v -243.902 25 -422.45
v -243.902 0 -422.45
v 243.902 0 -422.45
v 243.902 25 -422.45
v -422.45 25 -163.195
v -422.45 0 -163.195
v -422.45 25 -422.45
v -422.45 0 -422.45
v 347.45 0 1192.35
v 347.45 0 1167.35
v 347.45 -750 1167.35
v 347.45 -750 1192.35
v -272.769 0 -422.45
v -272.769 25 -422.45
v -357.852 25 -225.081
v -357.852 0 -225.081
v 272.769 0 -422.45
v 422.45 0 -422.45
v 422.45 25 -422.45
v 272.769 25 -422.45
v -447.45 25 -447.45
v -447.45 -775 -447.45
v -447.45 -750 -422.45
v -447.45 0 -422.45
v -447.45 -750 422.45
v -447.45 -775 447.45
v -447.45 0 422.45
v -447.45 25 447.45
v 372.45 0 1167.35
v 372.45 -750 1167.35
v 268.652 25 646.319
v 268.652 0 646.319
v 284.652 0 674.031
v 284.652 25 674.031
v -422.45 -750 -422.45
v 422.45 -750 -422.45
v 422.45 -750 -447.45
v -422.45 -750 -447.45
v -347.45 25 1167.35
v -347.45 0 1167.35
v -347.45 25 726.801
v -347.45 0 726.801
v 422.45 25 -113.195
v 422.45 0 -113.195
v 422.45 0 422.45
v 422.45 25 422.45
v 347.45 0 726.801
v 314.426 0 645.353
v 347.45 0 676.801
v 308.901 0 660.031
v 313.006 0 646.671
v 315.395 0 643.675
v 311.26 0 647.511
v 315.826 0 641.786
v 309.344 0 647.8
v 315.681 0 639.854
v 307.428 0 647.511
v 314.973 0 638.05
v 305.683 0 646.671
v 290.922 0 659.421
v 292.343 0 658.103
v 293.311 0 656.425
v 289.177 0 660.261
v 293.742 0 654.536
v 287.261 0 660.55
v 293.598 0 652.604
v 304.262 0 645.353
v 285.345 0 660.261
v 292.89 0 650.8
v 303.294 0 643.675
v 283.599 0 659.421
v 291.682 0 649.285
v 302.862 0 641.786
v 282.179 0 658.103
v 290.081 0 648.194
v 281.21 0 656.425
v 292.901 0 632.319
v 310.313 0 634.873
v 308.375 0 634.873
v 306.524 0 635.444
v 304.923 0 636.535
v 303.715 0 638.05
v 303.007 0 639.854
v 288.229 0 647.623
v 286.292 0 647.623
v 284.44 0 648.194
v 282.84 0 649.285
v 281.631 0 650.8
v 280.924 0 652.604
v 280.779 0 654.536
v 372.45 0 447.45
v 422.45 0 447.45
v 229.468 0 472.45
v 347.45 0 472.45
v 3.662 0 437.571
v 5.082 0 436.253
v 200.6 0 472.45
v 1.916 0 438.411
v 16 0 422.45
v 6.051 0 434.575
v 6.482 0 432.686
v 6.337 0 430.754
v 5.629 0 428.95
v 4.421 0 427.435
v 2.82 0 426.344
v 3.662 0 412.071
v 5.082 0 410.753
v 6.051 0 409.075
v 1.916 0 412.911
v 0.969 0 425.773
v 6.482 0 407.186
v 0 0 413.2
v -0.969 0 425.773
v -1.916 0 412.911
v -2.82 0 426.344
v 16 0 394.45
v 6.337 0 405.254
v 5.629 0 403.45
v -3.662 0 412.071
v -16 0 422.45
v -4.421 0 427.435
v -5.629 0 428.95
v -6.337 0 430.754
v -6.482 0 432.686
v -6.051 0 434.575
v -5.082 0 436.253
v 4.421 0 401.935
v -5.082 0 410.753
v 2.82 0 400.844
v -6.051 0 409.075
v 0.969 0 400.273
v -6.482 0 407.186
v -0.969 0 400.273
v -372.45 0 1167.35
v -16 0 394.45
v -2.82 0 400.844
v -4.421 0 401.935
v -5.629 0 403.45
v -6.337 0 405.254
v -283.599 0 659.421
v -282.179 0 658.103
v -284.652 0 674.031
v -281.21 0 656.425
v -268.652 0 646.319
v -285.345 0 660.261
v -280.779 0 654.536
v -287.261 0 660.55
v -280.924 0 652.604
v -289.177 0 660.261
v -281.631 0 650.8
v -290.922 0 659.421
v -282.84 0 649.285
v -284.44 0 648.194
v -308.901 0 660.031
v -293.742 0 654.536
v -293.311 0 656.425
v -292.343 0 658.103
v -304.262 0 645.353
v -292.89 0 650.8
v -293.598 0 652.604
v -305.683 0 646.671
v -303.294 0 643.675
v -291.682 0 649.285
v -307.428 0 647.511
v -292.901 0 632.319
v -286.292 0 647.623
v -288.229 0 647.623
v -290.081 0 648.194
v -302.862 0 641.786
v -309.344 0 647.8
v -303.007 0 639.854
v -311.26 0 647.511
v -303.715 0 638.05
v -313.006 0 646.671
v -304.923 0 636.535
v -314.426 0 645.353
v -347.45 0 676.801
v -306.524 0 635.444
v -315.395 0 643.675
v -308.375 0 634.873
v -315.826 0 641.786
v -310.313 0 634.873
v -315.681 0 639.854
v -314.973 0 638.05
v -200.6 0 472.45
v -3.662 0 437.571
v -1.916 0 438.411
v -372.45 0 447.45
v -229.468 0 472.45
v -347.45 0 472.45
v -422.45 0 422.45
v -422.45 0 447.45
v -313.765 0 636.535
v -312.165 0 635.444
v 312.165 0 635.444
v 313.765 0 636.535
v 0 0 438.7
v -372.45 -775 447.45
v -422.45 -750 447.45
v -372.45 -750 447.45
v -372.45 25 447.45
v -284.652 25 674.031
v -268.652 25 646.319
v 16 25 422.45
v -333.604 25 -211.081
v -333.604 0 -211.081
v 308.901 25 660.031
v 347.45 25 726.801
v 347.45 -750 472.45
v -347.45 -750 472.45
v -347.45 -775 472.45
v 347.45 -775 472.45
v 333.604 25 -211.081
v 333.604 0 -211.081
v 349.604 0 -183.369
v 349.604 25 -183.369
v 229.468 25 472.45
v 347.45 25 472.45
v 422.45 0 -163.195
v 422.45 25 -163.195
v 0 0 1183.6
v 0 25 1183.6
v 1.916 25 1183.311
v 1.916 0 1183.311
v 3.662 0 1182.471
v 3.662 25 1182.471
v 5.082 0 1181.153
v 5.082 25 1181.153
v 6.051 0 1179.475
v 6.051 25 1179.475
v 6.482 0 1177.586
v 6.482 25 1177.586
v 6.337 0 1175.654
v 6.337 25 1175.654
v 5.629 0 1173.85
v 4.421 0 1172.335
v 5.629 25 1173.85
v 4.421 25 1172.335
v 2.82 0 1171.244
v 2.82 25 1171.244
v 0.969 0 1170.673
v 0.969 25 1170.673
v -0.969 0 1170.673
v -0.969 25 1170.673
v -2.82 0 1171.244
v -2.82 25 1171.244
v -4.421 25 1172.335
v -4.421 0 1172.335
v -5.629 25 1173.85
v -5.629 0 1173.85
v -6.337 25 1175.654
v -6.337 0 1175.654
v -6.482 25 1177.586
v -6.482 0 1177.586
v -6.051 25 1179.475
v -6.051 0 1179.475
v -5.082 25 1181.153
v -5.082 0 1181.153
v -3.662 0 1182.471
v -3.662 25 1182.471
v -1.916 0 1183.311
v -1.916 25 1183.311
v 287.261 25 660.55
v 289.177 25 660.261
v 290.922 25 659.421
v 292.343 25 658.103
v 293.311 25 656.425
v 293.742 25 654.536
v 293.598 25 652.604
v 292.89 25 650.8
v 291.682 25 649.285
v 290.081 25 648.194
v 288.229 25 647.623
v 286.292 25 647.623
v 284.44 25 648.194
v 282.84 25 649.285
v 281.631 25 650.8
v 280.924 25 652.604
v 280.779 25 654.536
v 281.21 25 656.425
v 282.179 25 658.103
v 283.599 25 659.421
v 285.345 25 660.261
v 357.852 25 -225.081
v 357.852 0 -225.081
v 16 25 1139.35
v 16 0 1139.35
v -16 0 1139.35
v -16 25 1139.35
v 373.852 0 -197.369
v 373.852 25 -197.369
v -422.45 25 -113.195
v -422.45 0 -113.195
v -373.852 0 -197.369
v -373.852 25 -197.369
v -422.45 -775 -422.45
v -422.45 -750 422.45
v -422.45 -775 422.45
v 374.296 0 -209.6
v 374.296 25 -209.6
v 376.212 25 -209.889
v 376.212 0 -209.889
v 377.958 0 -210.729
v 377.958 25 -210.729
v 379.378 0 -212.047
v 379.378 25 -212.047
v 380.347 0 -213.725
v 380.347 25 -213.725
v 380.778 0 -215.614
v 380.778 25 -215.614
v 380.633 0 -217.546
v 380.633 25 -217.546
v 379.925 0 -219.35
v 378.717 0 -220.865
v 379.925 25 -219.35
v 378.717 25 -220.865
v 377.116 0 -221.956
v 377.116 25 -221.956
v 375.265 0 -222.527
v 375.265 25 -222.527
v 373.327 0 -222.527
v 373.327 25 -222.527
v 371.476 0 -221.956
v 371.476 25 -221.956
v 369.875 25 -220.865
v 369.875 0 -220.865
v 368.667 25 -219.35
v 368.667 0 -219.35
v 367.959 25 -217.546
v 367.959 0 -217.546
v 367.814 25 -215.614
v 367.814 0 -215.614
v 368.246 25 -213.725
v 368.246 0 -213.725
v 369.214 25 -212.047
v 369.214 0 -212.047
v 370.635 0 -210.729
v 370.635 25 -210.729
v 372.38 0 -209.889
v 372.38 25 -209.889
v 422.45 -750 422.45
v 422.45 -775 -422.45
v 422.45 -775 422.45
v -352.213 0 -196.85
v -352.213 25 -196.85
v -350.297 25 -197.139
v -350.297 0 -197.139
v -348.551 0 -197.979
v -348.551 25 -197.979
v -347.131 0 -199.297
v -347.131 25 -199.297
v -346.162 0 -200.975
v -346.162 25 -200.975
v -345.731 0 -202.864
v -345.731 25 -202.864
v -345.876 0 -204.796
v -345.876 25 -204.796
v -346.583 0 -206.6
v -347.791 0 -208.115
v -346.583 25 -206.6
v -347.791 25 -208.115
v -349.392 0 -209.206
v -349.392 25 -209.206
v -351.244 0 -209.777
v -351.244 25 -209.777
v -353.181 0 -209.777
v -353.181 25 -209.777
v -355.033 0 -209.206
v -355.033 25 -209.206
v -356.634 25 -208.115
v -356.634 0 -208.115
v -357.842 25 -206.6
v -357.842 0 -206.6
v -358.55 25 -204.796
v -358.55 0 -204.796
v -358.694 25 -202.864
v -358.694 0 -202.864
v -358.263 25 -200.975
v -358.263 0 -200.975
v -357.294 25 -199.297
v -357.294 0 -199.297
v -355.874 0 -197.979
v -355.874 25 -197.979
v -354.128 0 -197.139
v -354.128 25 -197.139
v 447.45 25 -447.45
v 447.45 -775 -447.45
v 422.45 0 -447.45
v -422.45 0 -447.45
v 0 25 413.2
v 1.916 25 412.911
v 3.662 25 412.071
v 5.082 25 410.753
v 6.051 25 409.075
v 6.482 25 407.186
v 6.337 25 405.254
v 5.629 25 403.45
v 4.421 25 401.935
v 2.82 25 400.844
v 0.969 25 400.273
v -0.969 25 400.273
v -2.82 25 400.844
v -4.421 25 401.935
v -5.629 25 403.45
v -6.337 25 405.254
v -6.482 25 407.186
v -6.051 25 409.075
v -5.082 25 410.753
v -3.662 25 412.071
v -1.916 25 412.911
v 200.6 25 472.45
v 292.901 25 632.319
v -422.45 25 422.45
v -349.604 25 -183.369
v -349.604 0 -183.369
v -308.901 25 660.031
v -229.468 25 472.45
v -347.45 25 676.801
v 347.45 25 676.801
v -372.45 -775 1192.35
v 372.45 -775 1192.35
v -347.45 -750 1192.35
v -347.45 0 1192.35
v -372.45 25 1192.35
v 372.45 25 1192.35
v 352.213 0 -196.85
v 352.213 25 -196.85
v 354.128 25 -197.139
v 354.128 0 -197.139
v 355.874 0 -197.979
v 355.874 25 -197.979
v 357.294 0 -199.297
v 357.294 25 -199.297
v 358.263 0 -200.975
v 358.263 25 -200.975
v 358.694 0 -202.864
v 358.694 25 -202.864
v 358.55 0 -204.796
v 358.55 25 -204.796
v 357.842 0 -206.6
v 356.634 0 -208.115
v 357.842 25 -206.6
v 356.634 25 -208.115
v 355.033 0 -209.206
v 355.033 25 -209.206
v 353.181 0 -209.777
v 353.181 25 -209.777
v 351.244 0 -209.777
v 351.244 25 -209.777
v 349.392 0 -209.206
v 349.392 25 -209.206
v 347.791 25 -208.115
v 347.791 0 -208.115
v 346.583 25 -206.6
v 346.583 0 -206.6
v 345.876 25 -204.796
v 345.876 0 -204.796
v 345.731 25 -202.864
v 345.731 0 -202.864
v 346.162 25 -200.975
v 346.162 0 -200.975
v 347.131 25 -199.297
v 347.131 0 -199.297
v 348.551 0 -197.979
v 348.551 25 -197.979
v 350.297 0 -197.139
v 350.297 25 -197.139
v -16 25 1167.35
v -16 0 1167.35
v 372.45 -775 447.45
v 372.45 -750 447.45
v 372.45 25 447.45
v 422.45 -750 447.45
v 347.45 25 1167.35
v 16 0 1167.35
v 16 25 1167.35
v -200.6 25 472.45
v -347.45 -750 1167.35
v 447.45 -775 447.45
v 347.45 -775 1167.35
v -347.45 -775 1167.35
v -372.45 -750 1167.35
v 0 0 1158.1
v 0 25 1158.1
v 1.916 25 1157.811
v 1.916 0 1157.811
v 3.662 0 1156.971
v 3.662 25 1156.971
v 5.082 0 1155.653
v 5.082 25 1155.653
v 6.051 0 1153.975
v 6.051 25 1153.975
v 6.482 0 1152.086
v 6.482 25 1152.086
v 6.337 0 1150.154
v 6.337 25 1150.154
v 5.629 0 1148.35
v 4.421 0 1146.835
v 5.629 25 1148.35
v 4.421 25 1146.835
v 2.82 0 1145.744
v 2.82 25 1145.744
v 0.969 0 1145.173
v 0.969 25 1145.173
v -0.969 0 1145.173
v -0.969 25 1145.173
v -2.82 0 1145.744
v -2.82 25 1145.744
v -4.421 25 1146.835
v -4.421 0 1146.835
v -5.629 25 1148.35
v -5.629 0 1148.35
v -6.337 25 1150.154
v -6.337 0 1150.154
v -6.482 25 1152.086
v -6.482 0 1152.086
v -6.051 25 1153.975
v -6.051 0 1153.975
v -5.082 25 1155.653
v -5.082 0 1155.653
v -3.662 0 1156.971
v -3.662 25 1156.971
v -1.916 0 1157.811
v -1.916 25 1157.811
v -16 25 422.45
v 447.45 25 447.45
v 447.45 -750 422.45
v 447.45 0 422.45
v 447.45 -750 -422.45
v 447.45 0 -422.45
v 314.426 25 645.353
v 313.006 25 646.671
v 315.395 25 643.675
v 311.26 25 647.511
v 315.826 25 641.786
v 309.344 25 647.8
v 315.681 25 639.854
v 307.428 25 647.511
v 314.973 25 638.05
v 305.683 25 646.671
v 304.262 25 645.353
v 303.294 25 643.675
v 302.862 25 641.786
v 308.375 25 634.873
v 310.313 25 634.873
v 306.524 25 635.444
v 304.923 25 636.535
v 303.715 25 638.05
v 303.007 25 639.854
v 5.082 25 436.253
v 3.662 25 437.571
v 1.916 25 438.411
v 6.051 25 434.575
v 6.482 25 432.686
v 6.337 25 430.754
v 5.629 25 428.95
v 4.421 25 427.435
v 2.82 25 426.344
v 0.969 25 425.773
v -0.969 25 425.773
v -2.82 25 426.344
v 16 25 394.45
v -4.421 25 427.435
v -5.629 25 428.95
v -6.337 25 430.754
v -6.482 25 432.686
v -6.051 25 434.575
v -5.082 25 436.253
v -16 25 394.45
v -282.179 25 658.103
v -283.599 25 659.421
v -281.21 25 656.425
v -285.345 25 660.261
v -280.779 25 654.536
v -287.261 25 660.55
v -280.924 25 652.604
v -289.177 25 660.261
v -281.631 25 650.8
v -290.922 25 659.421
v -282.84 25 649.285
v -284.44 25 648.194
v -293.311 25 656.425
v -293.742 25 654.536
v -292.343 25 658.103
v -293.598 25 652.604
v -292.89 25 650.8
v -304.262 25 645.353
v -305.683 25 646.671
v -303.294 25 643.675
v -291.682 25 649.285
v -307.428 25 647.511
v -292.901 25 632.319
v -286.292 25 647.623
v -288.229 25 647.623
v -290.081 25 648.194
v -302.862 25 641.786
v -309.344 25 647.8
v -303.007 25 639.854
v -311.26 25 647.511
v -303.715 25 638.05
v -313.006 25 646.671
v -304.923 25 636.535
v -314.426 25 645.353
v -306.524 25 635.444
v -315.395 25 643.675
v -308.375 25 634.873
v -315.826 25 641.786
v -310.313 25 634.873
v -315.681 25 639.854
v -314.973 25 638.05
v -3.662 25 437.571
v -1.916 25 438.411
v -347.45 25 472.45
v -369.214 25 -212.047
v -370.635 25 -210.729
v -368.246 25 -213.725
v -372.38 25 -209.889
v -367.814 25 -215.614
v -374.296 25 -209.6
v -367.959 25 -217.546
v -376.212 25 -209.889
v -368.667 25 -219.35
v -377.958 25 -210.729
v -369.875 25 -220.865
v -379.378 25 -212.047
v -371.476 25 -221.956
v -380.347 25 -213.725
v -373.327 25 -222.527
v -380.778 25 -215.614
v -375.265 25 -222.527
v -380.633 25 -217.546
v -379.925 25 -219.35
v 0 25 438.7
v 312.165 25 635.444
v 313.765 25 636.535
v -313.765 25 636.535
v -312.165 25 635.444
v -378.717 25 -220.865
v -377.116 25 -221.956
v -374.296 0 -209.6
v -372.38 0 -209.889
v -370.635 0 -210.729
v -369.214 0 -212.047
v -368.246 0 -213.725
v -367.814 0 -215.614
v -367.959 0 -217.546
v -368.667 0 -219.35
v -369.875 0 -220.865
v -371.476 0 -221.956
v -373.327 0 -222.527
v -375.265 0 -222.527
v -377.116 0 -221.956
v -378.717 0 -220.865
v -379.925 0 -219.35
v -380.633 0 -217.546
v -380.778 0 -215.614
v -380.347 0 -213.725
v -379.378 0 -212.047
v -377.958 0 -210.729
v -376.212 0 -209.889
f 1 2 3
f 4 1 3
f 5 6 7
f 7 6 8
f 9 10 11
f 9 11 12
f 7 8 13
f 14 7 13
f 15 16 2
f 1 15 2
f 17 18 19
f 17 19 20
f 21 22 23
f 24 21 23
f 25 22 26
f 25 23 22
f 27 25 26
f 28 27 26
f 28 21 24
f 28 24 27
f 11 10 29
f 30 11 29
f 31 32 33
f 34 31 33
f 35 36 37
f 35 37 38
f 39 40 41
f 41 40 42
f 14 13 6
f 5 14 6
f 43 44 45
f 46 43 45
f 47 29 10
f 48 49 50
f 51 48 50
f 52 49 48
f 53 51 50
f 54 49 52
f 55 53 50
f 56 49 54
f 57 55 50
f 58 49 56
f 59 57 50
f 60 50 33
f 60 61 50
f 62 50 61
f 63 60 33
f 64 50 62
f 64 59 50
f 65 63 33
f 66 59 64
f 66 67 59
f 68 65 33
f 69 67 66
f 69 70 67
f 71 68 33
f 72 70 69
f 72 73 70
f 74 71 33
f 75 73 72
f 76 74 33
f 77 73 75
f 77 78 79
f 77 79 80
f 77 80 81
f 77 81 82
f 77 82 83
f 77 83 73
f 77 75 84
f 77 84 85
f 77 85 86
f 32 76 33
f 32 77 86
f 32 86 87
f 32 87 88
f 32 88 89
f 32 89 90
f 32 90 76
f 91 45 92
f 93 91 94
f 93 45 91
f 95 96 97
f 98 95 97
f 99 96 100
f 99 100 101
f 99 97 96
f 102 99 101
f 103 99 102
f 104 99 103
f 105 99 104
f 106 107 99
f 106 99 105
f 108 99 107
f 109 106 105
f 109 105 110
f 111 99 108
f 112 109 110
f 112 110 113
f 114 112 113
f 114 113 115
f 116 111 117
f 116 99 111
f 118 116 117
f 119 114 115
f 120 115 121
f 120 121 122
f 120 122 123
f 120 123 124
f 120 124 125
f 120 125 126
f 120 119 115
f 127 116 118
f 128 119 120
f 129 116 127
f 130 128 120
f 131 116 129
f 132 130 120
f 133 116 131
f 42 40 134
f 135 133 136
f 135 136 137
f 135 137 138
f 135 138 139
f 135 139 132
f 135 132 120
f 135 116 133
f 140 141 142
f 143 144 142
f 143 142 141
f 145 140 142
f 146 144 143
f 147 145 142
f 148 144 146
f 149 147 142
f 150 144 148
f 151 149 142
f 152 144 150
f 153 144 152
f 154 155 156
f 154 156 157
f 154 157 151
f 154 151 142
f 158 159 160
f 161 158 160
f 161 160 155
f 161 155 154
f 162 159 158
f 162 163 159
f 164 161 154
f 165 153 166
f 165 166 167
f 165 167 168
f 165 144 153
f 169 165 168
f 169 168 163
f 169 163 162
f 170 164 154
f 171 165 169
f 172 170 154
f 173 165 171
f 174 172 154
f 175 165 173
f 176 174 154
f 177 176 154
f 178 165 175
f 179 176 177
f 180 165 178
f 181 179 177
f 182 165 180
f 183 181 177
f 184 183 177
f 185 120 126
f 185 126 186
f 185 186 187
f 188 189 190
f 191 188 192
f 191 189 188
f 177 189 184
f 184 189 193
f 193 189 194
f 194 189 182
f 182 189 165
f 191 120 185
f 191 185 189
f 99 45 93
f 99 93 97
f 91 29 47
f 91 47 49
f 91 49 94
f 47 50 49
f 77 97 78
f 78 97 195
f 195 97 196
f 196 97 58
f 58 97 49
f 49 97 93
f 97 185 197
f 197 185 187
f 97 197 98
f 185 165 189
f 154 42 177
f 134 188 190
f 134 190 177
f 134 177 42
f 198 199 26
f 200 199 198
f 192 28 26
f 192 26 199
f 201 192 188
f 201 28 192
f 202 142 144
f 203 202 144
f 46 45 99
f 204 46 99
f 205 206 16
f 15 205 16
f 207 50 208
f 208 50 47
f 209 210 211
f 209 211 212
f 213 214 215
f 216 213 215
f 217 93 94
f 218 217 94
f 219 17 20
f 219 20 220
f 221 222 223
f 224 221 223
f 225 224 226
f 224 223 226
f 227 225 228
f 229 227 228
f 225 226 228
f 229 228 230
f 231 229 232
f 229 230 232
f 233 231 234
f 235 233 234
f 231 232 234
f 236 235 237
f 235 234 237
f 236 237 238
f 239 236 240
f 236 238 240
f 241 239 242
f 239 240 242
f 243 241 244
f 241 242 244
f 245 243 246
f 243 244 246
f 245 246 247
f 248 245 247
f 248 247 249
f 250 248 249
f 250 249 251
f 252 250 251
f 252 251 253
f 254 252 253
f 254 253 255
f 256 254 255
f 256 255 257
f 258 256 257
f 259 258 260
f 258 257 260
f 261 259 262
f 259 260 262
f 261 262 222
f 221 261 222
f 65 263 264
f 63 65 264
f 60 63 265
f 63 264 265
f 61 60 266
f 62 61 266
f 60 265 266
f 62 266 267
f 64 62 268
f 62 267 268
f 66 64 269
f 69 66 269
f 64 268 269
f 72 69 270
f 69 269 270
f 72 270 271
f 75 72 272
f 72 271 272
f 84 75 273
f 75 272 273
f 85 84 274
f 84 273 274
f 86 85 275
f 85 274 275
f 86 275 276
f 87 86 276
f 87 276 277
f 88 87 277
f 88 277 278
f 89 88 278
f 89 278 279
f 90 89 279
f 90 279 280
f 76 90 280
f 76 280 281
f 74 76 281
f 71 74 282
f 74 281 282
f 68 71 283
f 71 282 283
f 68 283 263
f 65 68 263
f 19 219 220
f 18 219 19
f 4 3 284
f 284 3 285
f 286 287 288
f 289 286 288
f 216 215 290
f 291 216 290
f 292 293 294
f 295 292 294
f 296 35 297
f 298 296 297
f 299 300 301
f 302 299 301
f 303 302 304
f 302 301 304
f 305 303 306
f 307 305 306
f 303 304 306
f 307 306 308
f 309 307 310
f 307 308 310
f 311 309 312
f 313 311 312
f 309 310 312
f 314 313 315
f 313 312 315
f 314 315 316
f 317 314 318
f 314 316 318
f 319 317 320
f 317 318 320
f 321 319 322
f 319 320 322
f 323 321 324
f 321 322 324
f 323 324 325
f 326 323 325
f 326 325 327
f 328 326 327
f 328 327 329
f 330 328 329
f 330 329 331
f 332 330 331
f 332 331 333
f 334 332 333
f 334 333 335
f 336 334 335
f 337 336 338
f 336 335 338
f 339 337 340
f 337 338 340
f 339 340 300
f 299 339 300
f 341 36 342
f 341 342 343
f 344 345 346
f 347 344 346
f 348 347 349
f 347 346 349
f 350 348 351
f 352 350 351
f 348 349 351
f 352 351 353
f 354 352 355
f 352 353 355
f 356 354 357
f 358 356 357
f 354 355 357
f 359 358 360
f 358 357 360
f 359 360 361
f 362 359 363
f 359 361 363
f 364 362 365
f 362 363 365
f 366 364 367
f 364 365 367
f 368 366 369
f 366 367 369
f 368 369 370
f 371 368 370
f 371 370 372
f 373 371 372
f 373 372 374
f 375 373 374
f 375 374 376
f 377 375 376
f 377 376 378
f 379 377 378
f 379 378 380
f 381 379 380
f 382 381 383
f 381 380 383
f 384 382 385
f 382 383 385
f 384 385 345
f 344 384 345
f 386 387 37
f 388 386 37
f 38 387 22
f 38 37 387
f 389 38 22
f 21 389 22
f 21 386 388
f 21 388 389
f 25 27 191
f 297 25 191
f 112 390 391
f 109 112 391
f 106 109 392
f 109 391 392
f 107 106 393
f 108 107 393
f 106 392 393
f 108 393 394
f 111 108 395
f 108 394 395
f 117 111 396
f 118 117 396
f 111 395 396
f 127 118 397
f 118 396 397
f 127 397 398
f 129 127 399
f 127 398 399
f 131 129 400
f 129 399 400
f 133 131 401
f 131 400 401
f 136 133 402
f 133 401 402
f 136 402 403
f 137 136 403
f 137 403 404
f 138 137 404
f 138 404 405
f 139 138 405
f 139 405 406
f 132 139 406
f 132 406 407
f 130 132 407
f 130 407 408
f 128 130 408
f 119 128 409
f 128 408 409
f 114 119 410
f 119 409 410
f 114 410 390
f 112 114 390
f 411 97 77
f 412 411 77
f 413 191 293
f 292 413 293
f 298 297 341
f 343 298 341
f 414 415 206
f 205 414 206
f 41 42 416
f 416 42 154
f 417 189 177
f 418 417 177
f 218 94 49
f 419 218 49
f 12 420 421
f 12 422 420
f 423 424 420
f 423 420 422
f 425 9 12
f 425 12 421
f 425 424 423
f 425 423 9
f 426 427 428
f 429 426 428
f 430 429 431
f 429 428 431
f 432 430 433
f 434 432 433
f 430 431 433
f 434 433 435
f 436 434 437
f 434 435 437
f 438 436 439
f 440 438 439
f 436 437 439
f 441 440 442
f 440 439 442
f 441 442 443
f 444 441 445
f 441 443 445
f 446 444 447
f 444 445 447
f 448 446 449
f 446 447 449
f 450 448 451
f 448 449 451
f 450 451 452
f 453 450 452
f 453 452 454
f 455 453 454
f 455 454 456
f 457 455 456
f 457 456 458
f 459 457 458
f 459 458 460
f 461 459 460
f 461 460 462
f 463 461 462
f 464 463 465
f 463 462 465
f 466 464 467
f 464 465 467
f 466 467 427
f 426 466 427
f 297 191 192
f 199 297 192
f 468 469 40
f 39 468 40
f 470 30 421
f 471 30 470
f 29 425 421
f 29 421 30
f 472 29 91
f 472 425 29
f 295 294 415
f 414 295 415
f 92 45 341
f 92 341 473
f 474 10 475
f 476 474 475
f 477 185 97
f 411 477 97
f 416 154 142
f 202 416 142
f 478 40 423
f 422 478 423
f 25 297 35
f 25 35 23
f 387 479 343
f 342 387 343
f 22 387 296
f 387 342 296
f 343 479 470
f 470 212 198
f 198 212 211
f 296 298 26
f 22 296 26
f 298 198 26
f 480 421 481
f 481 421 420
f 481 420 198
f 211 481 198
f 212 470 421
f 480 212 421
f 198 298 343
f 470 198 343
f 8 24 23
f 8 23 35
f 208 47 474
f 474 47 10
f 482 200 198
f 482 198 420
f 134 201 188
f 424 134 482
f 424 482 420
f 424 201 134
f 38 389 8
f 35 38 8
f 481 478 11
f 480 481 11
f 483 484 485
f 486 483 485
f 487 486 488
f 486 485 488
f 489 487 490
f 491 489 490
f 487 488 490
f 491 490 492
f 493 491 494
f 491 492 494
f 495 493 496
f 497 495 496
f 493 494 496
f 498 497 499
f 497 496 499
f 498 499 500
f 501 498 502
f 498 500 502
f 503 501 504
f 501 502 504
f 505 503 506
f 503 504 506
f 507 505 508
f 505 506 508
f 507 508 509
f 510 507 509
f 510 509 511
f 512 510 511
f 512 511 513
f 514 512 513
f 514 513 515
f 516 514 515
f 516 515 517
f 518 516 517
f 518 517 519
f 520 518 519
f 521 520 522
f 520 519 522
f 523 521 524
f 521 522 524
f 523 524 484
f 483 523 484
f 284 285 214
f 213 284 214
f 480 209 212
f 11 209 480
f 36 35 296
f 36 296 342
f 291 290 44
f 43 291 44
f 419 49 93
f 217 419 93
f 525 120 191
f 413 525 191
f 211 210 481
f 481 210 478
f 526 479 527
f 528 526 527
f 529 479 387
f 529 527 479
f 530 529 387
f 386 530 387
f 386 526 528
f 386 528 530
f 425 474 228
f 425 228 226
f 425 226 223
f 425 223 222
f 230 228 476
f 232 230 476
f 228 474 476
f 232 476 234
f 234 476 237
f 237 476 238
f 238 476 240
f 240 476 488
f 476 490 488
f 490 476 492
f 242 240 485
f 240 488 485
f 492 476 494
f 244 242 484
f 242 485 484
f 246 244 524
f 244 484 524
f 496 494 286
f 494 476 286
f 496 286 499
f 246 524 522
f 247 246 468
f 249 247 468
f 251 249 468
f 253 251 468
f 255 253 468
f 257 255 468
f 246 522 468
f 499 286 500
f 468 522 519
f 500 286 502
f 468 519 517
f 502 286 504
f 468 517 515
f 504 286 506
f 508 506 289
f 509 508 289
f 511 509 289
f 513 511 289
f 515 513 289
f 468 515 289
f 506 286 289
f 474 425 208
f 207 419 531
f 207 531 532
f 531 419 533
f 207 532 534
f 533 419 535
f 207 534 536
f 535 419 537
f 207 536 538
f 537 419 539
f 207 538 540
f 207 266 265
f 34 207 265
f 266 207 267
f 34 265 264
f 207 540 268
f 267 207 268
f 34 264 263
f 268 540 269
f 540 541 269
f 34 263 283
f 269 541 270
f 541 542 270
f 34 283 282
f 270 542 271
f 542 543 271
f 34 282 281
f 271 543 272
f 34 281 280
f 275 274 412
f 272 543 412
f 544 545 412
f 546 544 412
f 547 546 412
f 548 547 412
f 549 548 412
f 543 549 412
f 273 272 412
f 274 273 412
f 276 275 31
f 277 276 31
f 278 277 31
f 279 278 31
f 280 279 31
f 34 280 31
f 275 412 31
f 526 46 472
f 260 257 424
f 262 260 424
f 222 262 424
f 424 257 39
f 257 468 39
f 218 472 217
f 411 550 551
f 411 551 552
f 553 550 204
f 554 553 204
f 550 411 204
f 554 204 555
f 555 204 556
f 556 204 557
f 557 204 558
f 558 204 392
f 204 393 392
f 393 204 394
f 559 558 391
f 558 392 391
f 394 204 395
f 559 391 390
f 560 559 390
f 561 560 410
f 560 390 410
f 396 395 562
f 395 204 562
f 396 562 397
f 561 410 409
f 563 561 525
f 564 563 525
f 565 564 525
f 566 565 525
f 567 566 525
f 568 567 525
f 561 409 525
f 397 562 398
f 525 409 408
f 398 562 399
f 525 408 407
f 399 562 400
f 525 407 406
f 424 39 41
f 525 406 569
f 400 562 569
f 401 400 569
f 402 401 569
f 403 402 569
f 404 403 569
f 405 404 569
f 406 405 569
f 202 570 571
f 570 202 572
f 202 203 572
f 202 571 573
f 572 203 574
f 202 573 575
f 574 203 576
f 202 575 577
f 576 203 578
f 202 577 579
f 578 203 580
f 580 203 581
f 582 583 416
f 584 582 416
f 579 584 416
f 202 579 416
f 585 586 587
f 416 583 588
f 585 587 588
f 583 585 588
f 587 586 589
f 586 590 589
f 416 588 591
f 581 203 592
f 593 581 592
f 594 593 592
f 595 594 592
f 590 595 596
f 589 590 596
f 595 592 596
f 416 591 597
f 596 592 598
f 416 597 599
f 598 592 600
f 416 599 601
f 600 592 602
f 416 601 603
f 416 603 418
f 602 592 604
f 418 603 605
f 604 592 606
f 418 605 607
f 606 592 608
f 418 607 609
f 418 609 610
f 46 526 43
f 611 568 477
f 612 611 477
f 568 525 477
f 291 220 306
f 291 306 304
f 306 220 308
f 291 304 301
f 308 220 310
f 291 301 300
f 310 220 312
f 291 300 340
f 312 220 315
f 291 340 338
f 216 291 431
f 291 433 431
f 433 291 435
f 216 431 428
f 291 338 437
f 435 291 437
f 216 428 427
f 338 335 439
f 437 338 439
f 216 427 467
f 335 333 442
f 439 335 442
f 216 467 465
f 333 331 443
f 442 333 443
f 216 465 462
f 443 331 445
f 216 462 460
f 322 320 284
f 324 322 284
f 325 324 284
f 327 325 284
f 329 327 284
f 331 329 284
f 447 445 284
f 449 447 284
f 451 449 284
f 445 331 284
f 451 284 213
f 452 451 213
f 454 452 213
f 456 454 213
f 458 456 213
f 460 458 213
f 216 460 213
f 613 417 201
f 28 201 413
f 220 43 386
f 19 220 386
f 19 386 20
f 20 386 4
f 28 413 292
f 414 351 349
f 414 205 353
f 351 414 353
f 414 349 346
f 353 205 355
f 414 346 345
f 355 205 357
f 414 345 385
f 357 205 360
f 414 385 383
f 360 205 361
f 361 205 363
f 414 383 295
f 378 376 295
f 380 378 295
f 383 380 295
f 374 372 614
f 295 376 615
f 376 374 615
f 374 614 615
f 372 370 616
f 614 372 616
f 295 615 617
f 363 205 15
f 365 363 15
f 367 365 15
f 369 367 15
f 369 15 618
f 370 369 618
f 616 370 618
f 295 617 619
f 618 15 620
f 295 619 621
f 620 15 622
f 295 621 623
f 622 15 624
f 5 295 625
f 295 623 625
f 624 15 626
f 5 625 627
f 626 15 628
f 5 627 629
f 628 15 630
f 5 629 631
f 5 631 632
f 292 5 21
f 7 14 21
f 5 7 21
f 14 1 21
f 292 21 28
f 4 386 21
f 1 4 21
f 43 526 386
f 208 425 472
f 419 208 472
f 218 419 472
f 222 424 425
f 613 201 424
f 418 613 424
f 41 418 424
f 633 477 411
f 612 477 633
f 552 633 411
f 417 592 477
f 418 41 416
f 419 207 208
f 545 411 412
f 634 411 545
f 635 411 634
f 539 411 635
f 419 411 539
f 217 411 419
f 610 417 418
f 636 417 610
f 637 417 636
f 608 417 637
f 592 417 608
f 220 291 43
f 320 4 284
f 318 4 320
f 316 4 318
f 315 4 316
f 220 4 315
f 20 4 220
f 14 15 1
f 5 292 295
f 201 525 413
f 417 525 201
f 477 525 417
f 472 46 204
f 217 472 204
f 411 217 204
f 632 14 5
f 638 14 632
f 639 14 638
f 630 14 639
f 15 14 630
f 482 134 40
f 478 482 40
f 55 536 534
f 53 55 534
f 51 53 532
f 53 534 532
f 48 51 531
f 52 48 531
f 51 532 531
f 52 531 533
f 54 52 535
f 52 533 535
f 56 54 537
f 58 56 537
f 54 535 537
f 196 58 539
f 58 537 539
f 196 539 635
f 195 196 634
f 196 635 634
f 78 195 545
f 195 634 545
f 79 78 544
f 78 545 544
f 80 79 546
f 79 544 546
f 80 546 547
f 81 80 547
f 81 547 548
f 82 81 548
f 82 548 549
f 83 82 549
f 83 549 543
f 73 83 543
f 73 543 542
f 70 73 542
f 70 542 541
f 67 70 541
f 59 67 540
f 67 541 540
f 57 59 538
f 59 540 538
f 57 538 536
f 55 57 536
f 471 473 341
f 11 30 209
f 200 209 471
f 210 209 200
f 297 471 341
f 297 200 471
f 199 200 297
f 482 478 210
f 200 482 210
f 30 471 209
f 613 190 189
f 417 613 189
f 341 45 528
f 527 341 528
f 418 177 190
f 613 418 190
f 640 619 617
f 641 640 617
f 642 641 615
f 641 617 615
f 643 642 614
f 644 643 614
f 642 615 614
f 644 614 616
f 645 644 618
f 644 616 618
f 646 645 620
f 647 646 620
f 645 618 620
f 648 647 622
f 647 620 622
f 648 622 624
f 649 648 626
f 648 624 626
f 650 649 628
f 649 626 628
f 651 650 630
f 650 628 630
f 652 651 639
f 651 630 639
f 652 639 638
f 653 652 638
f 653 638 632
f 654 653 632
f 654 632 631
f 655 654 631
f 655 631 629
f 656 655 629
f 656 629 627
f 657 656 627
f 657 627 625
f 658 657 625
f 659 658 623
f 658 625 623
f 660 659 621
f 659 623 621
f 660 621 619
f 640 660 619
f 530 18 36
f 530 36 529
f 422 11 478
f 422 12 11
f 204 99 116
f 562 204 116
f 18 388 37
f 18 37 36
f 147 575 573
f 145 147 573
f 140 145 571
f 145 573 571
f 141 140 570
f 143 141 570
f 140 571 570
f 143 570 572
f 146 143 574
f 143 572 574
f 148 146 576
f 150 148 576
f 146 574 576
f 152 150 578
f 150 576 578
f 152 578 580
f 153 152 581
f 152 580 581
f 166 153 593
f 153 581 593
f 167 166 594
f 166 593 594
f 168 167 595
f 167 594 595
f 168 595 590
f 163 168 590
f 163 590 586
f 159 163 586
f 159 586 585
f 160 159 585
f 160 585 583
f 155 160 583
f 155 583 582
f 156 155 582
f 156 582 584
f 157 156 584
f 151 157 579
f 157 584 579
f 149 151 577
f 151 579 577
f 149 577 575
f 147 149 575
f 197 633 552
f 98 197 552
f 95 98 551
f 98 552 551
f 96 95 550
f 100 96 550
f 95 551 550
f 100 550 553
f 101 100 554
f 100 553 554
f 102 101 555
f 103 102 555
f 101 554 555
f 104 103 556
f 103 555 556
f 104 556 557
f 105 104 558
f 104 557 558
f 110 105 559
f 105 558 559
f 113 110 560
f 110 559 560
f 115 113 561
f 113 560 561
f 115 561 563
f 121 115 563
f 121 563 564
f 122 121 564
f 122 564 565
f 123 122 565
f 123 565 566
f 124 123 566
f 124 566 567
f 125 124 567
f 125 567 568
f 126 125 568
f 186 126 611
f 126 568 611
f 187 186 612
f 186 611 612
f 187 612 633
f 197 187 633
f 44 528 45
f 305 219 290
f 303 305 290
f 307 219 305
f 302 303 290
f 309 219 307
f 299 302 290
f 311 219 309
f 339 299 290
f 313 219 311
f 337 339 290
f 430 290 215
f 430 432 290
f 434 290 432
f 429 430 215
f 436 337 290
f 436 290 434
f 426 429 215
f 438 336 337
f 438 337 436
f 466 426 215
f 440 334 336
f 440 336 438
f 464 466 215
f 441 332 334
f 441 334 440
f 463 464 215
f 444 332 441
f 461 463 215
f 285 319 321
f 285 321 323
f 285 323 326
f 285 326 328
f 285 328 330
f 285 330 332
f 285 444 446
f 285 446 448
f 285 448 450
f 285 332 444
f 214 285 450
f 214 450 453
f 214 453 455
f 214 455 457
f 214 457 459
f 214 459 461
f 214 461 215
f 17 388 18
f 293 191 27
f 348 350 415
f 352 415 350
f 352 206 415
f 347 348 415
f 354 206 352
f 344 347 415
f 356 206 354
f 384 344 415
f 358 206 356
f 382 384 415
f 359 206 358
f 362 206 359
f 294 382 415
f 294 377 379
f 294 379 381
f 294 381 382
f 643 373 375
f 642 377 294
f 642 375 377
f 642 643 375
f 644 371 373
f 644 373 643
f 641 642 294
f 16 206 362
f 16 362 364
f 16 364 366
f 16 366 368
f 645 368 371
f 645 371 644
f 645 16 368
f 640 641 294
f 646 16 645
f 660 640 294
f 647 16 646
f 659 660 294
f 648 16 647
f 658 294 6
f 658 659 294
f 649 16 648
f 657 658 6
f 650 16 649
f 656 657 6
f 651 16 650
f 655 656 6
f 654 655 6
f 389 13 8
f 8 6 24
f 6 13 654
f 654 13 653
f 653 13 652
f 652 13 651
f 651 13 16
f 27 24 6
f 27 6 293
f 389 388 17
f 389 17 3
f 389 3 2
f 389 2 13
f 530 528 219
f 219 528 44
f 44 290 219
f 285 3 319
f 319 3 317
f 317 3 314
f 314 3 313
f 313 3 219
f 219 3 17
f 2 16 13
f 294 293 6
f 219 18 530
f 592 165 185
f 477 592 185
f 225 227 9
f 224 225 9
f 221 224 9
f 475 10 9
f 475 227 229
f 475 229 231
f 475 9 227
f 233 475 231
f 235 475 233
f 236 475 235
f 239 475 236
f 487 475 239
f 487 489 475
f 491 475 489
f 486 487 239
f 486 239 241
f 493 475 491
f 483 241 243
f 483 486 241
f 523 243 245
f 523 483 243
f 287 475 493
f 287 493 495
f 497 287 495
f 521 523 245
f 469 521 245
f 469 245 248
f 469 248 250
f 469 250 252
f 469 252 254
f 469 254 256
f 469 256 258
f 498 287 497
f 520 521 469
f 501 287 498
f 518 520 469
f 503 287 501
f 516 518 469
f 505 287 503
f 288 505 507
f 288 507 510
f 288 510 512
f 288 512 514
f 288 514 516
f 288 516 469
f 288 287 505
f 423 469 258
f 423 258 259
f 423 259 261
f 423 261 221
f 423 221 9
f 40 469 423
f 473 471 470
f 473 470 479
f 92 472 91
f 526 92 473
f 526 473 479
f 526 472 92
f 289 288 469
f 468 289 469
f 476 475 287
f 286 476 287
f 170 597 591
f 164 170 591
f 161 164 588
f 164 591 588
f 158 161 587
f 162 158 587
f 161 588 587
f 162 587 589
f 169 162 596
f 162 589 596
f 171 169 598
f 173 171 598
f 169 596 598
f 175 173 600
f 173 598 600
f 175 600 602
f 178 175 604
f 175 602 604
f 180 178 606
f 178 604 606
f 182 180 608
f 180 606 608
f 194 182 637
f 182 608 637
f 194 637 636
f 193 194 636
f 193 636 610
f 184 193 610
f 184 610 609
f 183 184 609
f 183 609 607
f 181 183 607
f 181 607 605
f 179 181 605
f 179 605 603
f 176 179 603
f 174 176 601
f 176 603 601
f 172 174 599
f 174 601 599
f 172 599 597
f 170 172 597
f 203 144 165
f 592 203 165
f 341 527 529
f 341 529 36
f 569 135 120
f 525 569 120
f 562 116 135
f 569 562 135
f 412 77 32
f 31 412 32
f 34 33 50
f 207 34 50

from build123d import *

# Parameters (mm, degrees)
BOSS_EXTRUDE1_DEPTH = 25
SKETCH2_R           = 6.5
CUT_EXTRUDE1_DEPTH  = 25
SKETCH3_W           = 25
SKETCH3_H           = 25
BOSS_EXTRUDE2_DEPTH = 750
SKETCH4_W           = 844.9
SKETCH4_H           = 844.9
SKETCH4_W_2         = 694.9
SKETCH4_H_2         = 694.9
BOSS_EXTRUDE3_DEPTH = 25


with BuildPart() as part:
    # Sketch1 → Boss-Extrude1 (new body)
    with BuildSketch(Plane(origin=(0, 0, 0), x_dir=(1, 0, 0), z_dir=(0, 1, 0))):
        Polygon((-447.45, -447.45), (-447.45, 447.45), (447.45, 447.45), (447.45, -447.45), (372.45, -447.45), (372.45, -1192.35), (-372.45, -1192.35), (-372.45, -447.45), align=None)
        Polygon((-422.45, 422.45), (-272.769134679, 422.45), (-422.45, 163.195136343), align=None, mode=Mode.SUBTRACT)
        Polygon((422.45, 113.195136343), (422.45, -422.45), (16, -422.45), (16, -394.45), (-16, -394.45), (-16, -422.45), (-422.45, -422.45), (-422.45, 113.195136343), (-373.852431829, 197.368593539), (-349.603720523, 183.368593539), (-333.603720523, 211.081406461), (-357.852431829, 225.081406461), (-243.901621219, 422.45), (243.901621219, 422.45), (357.852431829, 225.081406461), (333.603720523, 211.081406461), (349.603720523, 183.368593539), (373.852431829, 197.368593539), align=None, mode=Mode.SUBTRACT)
        Polygon((272.769134679, 422.45), (422.45, 163.195136343), (422.45, 422.45), align=None, mode=Mode.SUBTRACT)
        Polygon((-347.45, -472.45), (-229.467864489, -472.45), (-347.45, -676.80105309), align=None, mode=Mode.SUBTRACT)
        Polygon((229.467864489, -472.45), (347.45, -472.45), (347.45, -676.80105309), align=None, mode=Mode.SUBTRACT)
        Polygon((-200.60035103, -472.45), (200.60035103, -472.45), (292.900526545, -632.318593539), (268.651815239, -646.318593539), (284.651815239, -674.031406461), (308.900526545, -660.031406461), (347.45, -726.80105309), (347.45, -1167.35), (16, -1167.35), (16, -1139.35), (-16, -1139.35), (-16, -1167.35), (-347.45, -1167.35), (-347.45, -726.80105309), (-308.900526545, -660.031406461), (-284.651815239, -674.031406461), (-268.651815239, -646.318593539), (-292.900526545, -632.318593539), align=None, mode=Mode.SUBTRACT)
    extrude(amount=BOSS_EXTRUDE1_DEPTH)

    # Sketch2 → Cut-Extrude1 (cut)
    with BuildSketch(Plane(origin=(0, 25, 0), x_dir=(1, 0, 0), z_dir=(0, 1, 0))):
        with Locations(Location((0, -432.2, 0), (0, 0, 270))):
            Circle(SKETCH2_R)
        with Locations(Location((374.296179516, 216.1, 0), (0, 0, 270))):
            Circle(SKETCH2_R)
        with Locations(Location((352.212531719, 203.35, 0), (0, 0, 270))):
            Circle(SKETCH2_R)
        with Locations(Location((-374.296179516, 216.1, 0), (0, 0, 270))):
            Circle(SKETCH2_R)
        with Locations(Location((-352.212531719, 203.35, 0), (0, 0, 270))):
            Circle(SKETCH2_R)
        with Locations(Location((0, -1177.1, 0), (0, 0, 270))):
            Circle(SKETCH2_R)
        with Locations(Location((0, -1151.6, 0), (0, 0, 270))):
            Circle(SKETCH2_R)
        with Locations(Location((-309.344274232, -641.3, 0), (0, 0, 270))):
            Circle(SKETCH2_R)
        with Locations(Location((-287.260626435, -654.05, 0), (0, 0, 270))):
            Circle(SKETCH2_R)
        with Locations(Location((309.344274232, -641.3, 0), (0, 0, 270))):
            Circle(SKETCH2_R)
        with Locations(Location((287.260626435, -654.05, 0), (0, 0, 270))):
            Circle(SKETCH2_R)
        with Locations(Location((0, -406.7, 0), (0, 0, 270))):
            Circle(SKETCH2_R)
    extrude(amount=-CUT_EXTRUDE1_DEPTH, mode=Mode.SUBTRACT)

    # Sketch3 → Boss-Extrude2 (add)
    with BuildSketch(Plane.XZ):
        with Locations((-359.95, 1179.85)):
            Rectangle(SKETCH3_W, SKETCH3_H)
        with Locations((359.95, 1179.85)):
            Rectangle(SKETCH3_W, SKETCH3_H)
        with Locations((434.95, 434.95)):
            Rectangle(SKETCH3_W, SKETCH3_H)
        with Locations((-434.95, 434.95)):
            Rectangle(SKETCH3_W, SKETCH3_H)
        with Locations((434.95, -434.95)):
            Rectangle(SKETCH3_W, SKETCH3_H)
        with Locations((-434.95, -434.95)):
            Rectangle(SKETCH3_W, SKETCH3_H)
    extrude(amount=BOSS_EXTRUDE2_DEPTH)

    # Sketch4 → Boss-Extrude3 (add)
    with BuildSketch(Plane.XZ.offset(750)):
        Polygon((-372.45, 447.45), (-372.45, 1192.35), (372.45, 1192.35), (372.45, 447.45), (447.45, 447.45), (447.45, -447.45), (-447.45, -447.45), (-447.45, 447.45), align=None)
        Rectangle(SKETCH4_W, SKETCH4_H, mode=Mode.SUBTRACT)
        with Locations((0, 819.9)):
            Rectangle(SKETCH4_W_2, SKETCH4_H_2, mode=Mode.SUBTRACT)
    extrude(amount=BOSS_EXTRUDE3_DEPTH)


solid = part.part
